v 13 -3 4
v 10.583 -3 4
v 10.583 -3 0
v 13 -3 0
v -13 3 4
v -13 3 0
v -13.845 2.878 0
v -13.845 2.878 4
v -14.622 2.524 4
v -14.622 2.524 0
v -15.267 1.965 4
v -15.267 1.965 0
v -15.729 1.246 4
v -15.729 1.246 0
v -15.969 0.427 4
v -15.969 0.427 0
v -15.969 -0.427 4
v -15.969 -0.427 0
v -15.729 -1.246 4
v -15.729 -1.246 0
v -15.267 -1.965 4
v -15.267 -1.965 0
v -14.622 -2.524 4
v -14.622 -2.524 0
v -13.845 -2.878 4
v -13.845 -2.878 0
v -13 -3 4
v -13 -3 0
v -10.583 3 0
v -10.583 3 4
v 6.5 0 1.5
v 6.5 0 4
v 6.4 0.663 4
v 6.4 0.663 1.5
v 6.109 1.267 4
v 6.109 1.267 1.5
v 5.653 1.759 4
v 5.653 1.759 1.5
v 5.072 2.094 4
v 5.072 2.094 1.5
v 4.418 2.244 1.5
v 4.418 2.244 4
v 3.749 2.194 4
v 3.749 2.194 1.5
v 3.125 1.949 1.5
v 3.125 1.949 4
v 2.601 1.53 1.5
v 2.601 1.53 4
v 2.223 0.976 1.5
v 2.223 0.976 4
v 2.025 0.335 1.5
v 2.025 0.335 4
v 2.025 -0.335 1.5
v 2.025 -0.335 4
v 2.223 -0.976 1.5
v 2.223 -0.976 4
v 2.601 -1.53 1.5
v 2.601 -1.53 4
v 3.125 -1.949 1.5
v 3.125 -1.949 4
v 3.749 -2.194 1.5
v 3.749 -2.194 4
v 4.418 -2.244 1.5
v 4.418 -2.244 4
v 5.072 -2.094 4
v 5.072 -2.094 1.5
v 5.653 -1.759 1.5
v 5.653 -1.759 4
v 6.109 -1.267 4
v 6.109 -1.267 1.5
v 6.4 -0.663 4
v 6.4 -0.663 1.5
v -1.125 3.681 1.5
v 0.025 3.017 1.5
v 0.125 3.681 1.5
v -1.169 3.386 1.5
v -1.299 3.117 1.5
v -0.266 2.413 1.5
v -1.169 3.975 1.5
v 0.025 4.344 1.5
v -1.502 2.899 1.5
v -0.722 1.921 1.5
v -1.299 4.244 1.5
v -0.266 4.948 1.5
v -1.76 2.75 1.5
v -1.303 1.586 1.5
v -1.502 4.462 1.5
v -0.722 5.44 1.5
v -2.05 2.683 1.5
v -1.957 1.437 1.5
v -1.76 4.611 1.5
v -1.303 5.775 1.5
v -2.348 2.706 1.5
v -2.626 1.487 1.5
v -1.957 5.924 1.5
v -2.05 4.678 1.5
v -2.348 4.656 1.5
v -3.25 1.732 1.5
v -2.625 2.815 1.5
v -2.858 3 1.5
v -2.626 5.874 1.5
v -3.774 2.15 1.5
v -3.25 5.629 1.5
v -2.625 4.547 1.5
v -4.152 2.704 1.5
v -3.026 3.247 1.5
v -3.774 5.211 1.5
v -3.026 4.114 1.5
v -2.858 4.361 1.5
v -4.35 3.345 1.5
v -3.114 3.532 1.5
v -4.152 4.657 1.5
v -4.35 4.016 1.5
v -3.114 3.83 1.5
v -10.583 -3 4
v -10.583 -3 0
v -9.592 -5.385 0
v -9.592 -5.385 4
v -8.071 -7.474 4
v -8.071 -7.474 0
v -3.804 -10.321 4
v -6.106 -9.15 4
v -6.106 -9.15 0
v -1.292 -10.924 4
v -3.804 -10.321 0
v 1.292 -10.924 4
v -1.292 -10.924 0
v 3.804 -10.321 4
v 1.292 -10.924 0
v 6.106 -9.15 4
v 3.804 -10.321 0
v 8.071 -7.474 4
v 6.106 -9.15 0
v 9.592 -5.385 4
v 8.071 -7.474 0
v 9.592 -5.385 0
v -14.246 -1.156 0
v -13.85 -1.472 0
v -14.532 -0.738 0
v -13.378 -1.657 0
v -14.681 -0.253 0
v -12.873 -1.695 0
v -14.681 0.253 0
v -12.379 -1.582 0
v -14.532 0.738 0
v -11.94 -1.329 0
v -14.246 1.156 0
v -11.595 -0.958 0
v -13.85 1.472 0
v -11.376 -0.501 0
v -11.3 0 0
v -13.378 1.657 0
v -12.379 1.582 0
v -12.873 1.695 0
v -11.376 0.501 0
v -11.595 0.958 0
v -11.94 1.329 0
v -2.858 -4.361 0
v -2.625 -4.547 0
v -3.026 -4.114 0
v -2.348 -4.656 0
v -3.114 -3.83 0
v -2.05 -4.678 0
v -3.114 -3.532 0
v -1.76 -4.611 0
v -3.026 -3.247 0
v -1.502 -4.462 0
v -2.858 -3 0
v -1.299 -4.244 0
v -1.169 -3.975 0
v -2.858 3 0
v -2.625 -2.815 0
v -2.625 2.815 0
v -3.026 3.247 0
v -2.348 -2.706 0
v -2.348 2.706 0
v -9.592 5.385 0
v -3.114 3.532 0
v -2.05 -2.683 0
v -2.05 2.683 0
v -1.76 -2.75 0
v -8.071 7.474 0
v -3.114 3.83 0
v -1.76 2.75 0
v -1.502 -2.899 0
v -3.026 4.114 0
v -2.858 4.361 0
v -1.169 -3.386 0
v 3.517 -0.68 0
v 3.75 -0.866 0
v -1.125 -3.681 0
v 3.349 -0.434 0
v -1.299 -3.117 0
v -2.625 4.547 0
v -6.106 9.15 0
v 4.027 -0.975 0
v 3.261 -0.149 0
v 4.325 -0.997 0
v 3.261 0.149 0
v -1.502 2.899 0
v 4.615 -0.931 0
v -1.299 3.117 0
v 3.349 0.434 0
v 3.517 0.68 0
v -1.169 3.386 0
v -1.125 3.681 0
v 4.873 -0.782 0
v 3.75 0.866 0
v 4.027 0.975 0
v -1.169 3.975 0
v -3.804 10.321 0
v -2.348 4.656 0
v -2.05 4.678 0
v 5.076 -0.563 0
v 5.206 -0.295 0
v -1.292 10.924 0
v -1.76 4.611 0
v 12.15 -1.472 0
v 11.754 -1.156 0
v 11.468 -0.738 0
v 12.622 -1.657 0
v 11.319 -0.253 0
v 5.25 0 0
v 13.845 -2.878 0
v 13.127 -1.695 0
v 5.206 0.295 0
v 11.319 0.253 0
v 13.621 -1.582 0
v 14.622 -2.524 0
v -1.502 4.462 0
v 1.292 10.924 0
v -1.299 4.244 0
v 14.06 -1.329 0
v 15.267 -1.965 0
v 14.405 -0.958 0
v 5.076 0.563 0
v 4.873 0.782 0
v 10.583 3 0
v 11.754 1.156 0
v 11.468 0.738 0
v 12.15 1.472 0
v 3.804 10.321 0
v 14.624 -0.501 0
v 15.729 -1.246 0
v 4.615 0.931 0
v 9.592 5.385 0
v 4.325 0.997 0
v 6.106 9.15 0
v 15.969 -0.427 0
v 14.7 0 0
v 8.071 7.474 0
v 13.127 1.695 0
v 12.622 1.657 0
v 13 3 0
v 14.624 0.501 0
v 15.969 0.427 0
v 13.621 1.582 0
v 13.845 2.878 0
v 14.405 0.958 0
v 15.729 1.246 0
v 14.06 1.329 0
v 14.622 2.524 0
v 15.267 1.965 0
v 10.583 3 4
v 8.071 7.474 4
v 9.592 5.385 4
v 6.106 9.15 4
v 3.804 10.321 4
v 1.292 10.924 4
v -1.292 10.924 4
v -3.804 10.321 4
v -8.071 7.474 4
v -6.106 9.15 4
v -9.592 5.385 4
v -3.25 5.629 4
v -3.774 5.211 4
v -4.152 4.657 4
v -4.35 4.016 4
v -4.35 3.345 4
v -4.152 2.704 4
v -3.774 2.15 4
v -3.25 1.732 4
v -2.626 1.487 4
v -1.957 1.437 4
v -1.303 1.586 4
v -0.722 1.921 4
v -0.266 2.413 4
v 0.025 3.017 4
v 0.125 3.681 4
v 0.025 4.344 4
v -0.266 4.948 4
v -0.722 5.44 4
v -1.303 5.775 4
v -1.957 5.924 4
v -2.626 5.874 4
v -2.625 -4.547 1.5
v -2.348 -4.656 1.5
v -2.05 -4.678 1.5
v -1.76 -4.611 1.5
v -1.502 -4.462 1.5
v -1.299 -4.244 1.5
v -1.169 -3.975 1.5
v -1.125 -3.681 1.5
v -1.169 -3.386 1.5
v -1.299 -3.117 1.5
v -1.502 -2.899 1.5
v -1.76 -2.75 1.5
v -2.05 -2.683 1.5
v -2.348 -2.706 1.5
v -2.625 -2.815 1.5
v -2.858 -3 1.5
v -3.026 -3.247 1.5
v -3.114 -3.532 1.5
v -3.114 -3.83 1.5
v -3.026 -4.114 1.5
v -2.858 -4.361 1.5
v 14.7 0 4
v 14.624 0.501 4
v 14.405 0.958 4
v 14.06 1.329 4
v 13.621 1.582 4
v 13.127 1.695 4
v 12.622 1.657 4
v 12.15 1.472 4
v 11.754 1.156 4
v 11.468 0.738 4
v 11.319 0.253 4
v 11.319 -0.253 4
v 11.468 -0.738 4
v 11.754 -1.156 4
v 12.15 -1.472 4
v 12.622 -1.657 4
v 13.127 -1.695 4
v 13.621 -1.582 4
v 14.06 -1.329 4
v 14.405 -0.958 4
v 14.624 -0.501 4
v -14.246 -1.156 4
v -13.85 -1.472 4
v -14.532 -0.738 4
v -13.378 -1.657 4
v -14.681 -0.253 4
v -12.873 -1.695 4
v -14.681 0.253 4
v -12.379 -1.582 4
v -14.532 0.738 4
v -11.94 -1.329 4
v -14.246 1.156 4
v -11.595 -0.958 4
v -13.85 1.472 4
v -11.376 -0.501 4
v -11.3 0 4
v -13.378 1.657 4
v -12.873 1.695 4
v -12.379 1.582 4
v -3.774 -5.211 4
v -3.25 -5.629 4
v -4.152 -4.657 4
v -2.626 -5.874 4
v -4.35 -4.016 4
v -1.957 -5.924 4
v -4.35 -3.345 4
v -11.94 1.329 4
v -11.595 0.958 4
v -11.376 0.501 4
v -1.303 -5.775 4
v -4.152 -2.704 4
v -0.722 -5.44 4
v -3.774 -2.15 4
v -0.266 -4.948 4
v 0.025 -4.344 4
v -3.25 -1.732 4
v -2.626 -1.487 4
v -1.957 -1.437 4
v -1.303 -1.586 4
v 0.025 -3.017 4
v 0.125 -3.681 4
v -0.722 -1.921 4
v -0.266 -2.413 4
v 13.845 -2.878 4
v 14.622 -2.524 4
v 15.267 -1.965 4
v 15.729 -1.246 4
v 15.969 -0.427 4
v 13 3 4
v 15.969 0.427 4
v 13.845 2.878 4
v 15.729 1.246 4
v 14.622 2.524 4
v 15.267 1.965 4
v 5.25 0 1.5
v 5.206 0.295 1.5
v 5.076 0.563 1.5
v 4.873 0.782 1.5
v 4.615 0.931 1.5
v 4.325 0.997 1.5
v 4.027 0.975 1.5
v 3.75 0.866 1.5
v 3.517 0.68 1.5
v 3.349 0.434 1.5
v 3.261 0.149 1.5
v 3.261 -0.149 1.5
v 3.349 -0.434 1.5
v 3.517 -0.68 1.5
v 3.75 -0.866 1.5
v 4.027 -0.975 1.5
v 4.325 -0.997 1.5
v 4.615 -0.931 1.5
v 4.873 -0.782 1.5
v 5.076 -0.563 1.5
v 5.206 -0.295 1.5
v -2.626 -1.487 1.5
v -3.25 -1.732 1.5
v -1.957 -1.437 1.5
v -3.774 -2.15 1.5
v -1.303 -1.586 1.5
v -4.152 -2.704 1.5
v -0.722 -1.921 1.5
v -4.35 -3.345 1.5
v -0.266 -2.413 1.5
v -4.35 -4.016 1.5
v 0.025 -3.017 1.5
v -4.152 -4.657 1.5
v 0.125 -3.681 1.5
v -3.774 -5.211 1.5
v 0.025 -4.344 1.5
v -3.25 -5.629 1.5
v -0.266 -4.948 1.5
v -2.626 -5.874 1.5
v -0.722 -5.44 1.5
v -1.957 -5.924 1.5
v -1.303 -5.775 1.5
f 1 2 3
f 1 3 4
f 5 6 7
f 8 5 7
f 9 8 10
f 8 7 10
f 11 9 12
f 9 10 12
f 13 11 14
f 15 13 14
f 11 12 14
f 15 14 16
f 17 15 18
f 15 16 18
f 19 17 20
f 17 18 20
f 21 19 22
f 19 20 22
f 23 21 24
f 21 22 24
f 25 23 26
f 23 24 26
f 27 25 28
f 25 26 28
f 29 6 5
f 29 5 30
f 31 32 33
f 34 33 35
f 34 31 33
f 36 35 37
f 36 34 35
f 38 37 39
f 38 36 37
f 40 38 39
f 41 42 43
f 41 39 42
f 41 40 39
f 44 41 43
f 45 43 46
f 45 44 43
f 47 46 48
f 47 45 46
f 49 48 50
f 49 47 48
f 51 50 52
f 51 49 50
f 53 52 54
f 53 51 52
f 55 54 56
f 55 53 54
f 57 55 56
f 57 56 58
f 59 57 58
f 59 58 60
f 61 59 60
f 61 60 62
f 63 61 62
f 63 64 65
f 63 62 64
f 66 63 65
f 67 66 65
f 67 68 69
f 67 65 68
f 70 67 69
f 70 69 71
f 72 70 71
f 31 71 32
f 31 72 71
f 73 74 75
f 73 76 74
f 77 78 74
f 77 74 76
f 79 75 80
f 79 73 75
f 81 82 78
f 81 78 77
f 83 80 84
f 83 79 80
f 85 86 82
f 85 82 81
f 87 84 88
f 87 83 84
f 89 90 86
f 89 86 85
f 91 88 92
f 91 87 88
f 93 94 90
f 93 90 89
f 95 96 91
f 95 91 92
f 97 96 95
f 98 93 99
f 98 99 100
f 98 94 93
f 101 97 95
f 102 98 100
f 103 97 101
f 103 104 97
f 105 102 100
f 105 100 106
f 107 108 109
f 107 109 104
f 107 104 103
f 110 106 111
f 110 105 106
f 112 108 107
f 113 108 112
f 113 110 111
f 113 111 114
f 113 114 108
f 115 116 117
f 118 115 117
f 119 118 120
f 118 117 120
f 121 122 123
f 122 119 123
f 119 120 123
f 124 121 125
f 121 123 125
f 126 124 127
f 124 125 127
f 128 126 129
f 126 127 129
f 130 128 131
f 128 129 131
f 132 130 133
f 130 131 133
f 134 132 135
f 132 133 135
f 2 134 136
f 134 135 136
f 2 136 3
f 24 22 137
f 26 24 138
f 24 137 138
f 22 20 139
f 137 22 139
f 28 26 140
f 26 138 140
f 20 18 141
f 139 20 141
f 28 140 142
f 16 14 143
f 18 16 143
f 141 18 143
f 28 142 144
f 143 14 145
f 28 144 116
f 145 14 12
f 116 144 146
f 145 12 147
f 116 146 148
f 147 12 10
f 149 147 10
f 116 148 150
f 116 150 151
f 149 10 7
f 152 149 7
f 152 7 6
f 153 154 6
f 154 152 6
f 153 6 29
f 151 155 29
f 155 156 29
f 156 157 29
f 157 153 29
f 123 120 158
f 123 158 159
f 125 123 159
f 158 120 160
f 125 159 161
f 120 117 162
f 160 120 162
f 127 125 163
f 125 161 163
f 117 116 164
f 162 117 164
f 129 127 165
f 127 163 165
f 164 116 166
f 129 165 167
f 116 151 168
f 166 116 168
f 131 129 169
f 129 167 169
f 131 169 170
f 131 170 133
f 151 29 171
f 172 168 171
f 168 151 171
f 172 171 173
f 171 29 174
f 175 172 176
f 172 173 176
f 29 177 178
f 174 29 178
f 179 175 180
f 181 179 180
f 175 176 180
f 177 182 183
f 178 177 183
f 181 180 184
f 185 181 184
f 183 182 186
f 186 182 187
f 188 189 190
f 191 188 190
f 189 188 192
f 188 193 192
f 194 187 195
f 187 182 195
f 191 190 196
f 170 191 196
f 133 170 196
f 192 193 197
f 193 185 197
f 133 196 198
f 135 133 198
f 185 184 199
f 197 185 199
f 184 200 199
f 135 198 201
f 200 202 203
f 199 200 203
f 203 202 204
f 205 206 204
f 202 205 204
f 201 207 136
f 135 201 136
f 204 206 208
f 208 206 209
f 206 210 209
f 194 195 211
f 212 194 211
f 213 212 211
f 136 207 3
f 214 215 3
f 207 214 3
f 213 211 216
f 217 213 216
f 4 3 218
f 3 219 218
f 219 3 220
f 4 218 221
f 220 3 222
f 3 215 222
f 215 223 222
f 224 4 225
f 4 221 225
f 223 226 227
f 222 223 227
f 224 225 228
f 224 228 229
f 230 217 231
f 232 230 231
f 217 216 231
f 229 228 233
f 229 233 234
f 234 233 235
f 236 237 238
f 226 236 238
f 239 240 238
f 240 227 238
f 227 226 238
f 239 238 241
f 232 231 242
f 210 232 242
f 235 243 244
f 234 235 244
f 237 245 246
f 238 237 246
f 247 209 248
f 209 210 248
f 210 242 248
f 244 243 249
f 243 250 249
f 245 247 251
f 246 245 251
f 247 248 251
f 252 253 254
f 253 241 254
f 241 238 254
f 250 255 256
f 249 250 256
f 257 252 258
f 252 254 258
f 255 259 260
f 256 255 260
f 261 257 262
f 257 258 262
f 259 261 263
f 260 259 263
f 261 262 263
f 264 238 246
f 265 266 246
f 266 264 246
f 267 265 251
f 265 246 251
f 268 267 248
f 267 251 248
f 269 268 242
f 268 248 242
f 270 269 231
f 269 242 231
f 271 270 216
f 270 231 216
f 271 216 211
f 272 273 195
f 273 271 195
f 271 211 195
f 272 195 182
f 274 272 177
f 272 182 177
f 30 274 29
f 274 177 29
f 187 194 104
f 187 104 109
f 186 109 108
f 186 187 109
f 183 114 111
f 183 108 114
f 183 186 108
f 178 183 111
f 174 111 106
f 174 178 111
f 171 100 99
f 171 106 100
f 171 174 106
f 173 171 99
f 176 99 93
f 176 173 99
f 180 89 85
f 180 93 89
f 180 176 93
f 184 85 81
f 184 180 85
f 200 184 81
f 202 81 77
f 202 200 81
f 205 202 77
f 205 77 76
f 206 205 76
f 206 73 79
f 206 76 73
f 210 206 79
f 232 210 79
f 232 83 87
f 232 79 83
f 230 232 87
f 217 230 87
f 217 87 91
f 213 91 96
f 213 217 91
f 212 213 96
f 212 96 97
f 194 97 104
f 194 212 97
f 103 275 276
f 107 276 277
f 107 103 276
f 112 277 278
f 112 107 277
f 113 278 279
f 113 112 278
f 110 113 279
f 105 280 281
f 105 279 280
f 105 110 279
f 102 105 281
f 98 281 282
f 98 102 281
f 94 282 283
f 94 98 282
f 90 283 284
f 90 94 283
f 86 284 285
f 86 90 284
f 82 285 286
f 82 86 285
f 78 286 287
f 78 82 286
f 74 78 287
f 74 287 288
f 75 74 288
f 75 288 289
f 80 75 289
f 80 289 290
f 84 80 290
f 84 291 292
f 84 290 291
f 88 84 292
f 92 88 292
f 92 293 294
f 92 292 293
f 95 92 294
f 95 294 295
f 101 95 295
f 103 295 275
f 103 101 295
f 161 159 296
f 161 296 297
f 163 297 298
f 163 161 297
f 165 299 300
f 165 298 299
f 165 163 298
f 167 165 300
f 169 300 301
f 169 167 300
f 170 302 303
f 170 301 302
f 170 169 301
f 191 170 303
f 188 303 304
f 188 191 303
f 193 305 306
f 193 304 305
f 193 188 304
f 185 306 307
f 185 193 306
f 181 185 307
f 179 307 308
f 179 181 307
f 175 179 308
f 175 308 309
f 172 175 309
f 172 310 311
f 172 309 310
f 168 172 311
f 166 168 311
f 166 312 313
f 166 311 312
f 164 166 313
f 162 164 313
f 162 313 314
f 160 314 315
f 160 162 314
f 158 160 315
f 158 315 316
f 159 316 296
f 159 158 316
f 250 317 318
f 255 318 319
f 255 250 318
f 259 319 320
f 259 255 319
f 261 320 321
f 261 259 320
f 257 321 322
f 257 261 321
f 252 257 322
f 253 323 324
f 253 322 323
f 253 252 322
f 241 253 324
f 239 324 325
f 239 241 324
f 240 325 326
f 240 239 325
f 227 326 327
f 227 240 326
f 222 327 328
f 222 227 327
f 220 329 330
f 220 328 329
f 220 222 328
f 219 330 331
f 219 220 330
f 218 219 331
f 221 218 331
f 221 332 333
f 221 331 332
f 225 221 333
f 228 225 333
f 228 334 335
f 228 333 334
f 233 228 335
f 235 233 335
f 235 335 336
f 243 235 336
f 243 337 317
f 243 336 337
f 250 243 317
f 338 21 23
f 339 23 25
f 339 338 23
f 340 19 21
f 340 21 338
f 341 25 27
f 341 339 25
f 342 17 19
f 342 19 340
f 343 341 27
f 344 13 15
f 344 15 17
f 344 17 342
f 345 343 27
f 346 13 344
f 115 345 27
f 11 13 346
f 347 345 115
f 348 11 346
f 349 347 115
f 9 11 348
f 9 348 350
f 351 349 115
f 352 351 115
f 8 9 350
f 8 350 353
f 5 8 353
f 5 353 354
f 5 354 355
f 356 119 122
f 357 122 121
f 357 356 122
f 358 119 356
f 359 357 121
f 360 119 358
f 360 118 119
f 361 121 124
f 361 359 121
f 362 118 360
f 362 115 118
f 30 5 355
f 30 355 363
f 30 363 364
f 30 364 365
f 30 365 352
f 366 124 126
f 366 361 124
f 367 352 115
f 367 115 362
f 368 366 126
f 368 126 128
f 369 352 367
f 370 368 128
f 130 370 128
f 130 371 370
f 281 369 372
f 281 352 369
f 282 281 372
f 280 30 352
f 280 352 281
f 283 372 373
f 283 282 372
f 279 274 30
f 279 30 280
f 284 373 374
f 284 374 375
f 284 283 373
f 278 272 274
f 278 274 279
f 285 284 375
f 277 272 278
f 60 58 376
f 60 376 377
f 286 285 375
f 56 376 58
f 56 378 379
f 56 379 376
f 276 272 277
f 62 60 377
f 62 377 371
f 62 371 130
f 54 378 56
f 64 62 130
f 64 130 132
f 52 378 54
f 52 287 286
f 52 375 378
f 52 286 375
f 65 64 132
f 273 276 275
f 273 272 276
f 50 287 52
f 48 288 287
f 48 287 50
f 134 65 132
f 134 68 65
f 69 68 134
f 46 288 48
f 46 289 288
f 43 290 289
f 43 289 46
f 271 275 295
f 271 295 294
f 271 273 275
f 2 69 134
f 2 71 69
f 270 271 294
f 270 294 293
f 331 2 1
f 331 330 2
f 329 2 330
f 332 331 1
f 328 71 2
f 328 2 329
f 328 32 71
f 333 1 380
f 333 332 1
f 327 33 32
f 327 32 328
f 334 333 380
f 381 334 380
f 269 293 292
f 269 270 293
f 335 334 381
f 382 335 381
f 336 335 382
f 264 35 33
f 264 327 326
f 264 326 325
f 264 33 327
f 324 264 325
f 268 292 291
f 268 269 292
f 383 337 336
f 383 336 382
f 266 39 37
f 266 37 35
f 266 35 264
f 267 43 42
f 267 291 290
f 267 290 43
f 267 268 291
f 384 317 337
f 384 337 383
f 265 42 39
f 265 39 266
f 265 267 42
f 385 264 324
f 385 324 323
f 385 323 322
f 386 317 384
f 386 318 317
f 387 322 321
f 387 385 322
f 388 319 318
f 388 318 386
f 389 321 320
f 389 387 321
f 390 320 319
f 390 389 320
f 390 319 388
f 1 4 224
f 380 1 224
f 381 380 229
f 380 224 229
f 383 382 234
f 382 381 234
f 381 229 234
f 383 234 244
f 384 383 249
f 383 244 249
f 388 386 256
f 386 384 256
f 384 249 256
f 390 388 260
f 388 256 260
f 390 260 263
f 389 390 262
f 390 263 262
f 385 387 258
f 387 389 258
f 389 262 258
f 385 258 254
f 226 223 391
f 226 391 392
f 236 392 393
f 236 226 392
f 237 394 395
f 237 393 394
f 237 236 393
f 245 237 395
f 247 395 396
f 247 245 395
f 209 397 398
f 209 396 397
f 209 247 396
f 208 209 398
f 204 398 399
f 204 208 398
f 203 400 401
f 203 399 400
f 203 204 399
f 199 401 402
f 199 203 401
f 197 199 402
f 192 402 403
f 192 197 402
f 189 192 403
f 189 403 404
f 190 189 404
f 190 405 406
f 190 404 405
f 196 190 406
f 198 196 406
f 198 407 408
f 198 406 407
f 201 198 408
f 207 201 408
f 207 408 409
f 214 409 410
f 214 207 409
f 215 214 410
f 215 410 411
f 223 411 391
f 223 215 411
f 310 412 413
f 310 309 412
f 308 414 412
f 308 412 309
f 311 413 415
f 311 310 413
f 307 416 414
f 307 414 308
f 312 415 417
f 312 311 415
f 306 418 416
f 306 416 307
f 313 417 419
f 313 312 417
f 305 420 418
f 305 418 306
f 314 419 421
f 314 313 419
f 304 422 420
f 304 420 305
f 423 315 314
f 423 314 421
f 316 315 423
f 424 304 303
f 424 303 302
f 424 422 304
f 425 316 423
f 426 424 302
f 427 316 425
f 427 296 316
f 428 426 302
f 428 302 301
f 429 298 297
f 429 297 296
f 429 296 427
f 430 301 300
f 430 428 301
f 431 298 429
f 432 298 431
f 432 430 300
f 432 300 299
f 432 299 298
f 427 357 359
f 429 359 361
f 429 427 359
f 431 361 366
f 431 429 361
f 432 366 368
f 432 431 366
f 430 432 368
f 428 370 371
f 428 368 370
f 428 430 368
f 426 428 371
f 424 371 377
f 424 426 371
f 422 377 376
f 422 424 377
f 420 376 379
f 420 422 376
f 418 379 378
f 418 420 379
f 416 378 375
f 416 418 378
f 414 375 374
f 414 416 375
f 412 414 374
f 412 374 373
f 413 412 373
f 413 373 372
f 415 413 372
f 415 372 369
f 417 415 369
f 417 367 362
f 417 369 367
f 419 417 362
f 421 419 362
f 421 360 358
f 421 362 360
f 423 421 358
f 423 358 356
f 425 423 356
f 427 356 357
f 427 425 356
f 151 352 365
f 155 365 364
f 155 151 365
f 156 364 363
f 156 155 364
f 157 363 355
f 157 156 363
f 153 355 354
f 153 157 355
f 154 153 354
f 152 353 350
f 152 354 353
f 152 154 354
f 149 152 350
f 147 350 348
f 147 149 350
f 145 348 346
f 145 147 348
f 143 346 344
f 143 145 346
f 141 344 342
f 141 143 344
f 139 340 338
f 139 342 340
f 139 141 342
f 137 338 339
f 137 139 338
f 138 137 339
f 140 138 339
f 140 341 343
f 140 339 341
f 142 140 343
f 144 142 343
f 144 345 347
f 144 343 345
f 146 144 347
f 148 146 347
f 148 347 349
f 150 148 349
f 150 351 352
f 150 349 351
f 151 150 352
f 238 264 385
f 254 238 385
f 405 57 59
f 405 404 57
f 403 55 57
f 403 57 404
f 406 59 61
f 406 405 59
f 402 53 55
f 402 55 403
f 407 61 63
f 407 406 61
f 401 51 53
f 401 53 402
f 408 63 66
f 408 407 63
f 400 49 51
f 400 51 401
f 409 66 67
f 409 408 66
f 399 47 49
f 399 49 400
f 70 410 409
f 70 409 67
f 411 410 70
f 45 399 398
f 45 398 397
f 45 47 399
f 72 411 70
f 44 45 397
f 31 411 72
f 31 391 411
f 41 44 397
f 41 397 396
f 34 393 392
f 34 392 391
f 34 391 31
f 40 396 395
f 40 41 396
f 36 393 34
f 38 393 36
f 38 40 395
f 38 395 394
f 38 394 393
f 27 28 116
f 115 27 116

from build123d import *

# Parameters (mm, degrees)
CYLINDER150_R     = 1.7
CYLINDER150_DEPTH = 11
CYLINDER151_R     = 1.7
CYLINDER151_DEPTH = 11
CYLINDER157_R     = 2.25
CYLINDER157_DEPTH = 8
CYLINDER156_R     = 1
CYLINDER156_DEPTH = 5
CYLINDER147_R     = 1
CYLINDER147_DEPTH = 1
ARRAY_COUNT       = 3
BOX_W             = 3
BOX_H             = 6
BOX_DEPTH         = 4
CYLINDER153_R     = 11
CYLINDER153_DEPTH = 4
BOX001_W          = 3
BOX001_H          = 6
BOX001_DEPTH      = 4
CYLINDER158_R     = 3
CYLINDER158_DEPTH = 4
CYLINDER_R        = 3
CYLINDER_DEPTH    = 4


with BuildPart() as wirefeedsmount1:
    # Cylinder150 → Cylinder150 (new body)
    with BuildSketch(Plane(origin=(-13, 0, 0), x_dir=(1, 0, 0), z_dir=(0, 0, 1))):
        Circle(CYLINDER150_R)
    extrude(amount=CYLINDER150_DEPTH)


with BuildPart() as wirefeedsmount002:
    # Cylinder151 → Cylinder151 (new body)
    with BuildSketch(Plane(origin=(13, 0, 0), x_dir=(1, 0, 0), z_dir=(0, 0, 1))):
        Circle(CYLINDER151_R)
    extrude(amount=CYLINDER151_DEPTH)


with BuildPart() as sealsubtraction:
    # Cylinder157 → Cylinder157 (new body)
    with BuildSketch(Plane.XY.offset(1.5)):
        Circle(CYLINDER157_R)
    extrude(amount=CYLINDER157_DEPTH)


with BuildPart() as bottomwireoutlet:
    # Cylinder156 → Cylinder156 (new body)
    with BuildSketch(Plane.XY.offset(-2)):
        Circle(CYLINDER156_R)
    extrude(amount=CYLINDER156_DEPTH)


with BuildPart() as fusion013:
    # Cylinder147 → Cylinder147 (new body)
    with BuildSketch(Plane.XY.offset(4.5)):
        Circle(CYLINDER147_R)
    extrude(amount=CYLINDER147_DEPTH)

    # Fusion: union SealSubtraction, BottomWireOutlet
    add(sealsubtraction.part)
    add(bottomwireoutlet.part)


with BuildPart() as fusion013_1:
    # Fusion placement: moved
    add(fusion013.part.moved(Location((4.25, 0, 0))))

    # Array: Fusion013 ×3 about axis
    array_axis = Axis((0, 0, 0), (0, 0, 1))


with BuildPart() as fusion013_2:
    add(fusion013_1.part)
    for i in range(1, ARRAY_COUNT):
        add(fusion013_1.part.rotate(array_axis, i * 360 / ARRAY_COUNT))

    # Fusion013: union WireFeedsMount1, WireFeedsMount002
    add(wirefeedsmount1.part)
    add(wirefeedsmount002.part)


with BuildPart() as mountcube1:
    # Box → Box (new body)
    with BuildSketch(Plane(origin=(-13, -3, 0), x_dir=(1, 0, 0), z_dir=(0, 0, 1))):
        with Locations((1.5, 3)):
            Rectangle(BOX_W, BOX_H)
    extrude(amount=BOX_DEPTH)


with BuildPart() as body:
    # Cylinder153 → Cylinder153 (new body)
    with BuildSketch(Plane.XY):
        Circle(CYLINDER153_R)
    extrude(amount=CYLINDER153_DEPTH)


with BuildPart() as mountcube002:
    # Box001 → Box001 (new body)
    with BuildSketch(Plane(origin=(10, -3, 0), x_dir=(1, 0, 0), z_dir=(0, 0, 1))):
        with Locations((1.5, 3)):
            Rectangle(BOX001_W, BOX001_H)
    extrude(amount=BOX001_DEPTH)


with BuildPart() as mountflange002:
    # Cylinder158 → Cylinder158 (new body)
    with BuildSketch(Plane(origin=(13, 0, 0), x_dir=(1, 0, 0), z_dir=(0, 0, 1))):
        Circle(CYLINDER158_R)
    extrude(amount=CYLINDER158_DEPTH)


with BuildPart() as cut:
    # Cylinder → Cylinder (new body)
    with BuildSketch(Plane(origin=(-13, 0, 0), x_dir=(1, 0, 0), z_dir=(0, 0, 1))):
        Circle(CYLINDER_R)
    extrude(amount=CYLINDER_DEPTH)

    # Fusion012: union MountCube1, Body, MountCube002, MountFlange002
    add(mountcube1.part)
    add(body.part)
    add(mountcube002.part)
    add(mountflange002.part)

    # Cut: cut Fusion013
    add(fusion013_2.part, mode=Mode.SUBTRACT)


solid = cut.part
